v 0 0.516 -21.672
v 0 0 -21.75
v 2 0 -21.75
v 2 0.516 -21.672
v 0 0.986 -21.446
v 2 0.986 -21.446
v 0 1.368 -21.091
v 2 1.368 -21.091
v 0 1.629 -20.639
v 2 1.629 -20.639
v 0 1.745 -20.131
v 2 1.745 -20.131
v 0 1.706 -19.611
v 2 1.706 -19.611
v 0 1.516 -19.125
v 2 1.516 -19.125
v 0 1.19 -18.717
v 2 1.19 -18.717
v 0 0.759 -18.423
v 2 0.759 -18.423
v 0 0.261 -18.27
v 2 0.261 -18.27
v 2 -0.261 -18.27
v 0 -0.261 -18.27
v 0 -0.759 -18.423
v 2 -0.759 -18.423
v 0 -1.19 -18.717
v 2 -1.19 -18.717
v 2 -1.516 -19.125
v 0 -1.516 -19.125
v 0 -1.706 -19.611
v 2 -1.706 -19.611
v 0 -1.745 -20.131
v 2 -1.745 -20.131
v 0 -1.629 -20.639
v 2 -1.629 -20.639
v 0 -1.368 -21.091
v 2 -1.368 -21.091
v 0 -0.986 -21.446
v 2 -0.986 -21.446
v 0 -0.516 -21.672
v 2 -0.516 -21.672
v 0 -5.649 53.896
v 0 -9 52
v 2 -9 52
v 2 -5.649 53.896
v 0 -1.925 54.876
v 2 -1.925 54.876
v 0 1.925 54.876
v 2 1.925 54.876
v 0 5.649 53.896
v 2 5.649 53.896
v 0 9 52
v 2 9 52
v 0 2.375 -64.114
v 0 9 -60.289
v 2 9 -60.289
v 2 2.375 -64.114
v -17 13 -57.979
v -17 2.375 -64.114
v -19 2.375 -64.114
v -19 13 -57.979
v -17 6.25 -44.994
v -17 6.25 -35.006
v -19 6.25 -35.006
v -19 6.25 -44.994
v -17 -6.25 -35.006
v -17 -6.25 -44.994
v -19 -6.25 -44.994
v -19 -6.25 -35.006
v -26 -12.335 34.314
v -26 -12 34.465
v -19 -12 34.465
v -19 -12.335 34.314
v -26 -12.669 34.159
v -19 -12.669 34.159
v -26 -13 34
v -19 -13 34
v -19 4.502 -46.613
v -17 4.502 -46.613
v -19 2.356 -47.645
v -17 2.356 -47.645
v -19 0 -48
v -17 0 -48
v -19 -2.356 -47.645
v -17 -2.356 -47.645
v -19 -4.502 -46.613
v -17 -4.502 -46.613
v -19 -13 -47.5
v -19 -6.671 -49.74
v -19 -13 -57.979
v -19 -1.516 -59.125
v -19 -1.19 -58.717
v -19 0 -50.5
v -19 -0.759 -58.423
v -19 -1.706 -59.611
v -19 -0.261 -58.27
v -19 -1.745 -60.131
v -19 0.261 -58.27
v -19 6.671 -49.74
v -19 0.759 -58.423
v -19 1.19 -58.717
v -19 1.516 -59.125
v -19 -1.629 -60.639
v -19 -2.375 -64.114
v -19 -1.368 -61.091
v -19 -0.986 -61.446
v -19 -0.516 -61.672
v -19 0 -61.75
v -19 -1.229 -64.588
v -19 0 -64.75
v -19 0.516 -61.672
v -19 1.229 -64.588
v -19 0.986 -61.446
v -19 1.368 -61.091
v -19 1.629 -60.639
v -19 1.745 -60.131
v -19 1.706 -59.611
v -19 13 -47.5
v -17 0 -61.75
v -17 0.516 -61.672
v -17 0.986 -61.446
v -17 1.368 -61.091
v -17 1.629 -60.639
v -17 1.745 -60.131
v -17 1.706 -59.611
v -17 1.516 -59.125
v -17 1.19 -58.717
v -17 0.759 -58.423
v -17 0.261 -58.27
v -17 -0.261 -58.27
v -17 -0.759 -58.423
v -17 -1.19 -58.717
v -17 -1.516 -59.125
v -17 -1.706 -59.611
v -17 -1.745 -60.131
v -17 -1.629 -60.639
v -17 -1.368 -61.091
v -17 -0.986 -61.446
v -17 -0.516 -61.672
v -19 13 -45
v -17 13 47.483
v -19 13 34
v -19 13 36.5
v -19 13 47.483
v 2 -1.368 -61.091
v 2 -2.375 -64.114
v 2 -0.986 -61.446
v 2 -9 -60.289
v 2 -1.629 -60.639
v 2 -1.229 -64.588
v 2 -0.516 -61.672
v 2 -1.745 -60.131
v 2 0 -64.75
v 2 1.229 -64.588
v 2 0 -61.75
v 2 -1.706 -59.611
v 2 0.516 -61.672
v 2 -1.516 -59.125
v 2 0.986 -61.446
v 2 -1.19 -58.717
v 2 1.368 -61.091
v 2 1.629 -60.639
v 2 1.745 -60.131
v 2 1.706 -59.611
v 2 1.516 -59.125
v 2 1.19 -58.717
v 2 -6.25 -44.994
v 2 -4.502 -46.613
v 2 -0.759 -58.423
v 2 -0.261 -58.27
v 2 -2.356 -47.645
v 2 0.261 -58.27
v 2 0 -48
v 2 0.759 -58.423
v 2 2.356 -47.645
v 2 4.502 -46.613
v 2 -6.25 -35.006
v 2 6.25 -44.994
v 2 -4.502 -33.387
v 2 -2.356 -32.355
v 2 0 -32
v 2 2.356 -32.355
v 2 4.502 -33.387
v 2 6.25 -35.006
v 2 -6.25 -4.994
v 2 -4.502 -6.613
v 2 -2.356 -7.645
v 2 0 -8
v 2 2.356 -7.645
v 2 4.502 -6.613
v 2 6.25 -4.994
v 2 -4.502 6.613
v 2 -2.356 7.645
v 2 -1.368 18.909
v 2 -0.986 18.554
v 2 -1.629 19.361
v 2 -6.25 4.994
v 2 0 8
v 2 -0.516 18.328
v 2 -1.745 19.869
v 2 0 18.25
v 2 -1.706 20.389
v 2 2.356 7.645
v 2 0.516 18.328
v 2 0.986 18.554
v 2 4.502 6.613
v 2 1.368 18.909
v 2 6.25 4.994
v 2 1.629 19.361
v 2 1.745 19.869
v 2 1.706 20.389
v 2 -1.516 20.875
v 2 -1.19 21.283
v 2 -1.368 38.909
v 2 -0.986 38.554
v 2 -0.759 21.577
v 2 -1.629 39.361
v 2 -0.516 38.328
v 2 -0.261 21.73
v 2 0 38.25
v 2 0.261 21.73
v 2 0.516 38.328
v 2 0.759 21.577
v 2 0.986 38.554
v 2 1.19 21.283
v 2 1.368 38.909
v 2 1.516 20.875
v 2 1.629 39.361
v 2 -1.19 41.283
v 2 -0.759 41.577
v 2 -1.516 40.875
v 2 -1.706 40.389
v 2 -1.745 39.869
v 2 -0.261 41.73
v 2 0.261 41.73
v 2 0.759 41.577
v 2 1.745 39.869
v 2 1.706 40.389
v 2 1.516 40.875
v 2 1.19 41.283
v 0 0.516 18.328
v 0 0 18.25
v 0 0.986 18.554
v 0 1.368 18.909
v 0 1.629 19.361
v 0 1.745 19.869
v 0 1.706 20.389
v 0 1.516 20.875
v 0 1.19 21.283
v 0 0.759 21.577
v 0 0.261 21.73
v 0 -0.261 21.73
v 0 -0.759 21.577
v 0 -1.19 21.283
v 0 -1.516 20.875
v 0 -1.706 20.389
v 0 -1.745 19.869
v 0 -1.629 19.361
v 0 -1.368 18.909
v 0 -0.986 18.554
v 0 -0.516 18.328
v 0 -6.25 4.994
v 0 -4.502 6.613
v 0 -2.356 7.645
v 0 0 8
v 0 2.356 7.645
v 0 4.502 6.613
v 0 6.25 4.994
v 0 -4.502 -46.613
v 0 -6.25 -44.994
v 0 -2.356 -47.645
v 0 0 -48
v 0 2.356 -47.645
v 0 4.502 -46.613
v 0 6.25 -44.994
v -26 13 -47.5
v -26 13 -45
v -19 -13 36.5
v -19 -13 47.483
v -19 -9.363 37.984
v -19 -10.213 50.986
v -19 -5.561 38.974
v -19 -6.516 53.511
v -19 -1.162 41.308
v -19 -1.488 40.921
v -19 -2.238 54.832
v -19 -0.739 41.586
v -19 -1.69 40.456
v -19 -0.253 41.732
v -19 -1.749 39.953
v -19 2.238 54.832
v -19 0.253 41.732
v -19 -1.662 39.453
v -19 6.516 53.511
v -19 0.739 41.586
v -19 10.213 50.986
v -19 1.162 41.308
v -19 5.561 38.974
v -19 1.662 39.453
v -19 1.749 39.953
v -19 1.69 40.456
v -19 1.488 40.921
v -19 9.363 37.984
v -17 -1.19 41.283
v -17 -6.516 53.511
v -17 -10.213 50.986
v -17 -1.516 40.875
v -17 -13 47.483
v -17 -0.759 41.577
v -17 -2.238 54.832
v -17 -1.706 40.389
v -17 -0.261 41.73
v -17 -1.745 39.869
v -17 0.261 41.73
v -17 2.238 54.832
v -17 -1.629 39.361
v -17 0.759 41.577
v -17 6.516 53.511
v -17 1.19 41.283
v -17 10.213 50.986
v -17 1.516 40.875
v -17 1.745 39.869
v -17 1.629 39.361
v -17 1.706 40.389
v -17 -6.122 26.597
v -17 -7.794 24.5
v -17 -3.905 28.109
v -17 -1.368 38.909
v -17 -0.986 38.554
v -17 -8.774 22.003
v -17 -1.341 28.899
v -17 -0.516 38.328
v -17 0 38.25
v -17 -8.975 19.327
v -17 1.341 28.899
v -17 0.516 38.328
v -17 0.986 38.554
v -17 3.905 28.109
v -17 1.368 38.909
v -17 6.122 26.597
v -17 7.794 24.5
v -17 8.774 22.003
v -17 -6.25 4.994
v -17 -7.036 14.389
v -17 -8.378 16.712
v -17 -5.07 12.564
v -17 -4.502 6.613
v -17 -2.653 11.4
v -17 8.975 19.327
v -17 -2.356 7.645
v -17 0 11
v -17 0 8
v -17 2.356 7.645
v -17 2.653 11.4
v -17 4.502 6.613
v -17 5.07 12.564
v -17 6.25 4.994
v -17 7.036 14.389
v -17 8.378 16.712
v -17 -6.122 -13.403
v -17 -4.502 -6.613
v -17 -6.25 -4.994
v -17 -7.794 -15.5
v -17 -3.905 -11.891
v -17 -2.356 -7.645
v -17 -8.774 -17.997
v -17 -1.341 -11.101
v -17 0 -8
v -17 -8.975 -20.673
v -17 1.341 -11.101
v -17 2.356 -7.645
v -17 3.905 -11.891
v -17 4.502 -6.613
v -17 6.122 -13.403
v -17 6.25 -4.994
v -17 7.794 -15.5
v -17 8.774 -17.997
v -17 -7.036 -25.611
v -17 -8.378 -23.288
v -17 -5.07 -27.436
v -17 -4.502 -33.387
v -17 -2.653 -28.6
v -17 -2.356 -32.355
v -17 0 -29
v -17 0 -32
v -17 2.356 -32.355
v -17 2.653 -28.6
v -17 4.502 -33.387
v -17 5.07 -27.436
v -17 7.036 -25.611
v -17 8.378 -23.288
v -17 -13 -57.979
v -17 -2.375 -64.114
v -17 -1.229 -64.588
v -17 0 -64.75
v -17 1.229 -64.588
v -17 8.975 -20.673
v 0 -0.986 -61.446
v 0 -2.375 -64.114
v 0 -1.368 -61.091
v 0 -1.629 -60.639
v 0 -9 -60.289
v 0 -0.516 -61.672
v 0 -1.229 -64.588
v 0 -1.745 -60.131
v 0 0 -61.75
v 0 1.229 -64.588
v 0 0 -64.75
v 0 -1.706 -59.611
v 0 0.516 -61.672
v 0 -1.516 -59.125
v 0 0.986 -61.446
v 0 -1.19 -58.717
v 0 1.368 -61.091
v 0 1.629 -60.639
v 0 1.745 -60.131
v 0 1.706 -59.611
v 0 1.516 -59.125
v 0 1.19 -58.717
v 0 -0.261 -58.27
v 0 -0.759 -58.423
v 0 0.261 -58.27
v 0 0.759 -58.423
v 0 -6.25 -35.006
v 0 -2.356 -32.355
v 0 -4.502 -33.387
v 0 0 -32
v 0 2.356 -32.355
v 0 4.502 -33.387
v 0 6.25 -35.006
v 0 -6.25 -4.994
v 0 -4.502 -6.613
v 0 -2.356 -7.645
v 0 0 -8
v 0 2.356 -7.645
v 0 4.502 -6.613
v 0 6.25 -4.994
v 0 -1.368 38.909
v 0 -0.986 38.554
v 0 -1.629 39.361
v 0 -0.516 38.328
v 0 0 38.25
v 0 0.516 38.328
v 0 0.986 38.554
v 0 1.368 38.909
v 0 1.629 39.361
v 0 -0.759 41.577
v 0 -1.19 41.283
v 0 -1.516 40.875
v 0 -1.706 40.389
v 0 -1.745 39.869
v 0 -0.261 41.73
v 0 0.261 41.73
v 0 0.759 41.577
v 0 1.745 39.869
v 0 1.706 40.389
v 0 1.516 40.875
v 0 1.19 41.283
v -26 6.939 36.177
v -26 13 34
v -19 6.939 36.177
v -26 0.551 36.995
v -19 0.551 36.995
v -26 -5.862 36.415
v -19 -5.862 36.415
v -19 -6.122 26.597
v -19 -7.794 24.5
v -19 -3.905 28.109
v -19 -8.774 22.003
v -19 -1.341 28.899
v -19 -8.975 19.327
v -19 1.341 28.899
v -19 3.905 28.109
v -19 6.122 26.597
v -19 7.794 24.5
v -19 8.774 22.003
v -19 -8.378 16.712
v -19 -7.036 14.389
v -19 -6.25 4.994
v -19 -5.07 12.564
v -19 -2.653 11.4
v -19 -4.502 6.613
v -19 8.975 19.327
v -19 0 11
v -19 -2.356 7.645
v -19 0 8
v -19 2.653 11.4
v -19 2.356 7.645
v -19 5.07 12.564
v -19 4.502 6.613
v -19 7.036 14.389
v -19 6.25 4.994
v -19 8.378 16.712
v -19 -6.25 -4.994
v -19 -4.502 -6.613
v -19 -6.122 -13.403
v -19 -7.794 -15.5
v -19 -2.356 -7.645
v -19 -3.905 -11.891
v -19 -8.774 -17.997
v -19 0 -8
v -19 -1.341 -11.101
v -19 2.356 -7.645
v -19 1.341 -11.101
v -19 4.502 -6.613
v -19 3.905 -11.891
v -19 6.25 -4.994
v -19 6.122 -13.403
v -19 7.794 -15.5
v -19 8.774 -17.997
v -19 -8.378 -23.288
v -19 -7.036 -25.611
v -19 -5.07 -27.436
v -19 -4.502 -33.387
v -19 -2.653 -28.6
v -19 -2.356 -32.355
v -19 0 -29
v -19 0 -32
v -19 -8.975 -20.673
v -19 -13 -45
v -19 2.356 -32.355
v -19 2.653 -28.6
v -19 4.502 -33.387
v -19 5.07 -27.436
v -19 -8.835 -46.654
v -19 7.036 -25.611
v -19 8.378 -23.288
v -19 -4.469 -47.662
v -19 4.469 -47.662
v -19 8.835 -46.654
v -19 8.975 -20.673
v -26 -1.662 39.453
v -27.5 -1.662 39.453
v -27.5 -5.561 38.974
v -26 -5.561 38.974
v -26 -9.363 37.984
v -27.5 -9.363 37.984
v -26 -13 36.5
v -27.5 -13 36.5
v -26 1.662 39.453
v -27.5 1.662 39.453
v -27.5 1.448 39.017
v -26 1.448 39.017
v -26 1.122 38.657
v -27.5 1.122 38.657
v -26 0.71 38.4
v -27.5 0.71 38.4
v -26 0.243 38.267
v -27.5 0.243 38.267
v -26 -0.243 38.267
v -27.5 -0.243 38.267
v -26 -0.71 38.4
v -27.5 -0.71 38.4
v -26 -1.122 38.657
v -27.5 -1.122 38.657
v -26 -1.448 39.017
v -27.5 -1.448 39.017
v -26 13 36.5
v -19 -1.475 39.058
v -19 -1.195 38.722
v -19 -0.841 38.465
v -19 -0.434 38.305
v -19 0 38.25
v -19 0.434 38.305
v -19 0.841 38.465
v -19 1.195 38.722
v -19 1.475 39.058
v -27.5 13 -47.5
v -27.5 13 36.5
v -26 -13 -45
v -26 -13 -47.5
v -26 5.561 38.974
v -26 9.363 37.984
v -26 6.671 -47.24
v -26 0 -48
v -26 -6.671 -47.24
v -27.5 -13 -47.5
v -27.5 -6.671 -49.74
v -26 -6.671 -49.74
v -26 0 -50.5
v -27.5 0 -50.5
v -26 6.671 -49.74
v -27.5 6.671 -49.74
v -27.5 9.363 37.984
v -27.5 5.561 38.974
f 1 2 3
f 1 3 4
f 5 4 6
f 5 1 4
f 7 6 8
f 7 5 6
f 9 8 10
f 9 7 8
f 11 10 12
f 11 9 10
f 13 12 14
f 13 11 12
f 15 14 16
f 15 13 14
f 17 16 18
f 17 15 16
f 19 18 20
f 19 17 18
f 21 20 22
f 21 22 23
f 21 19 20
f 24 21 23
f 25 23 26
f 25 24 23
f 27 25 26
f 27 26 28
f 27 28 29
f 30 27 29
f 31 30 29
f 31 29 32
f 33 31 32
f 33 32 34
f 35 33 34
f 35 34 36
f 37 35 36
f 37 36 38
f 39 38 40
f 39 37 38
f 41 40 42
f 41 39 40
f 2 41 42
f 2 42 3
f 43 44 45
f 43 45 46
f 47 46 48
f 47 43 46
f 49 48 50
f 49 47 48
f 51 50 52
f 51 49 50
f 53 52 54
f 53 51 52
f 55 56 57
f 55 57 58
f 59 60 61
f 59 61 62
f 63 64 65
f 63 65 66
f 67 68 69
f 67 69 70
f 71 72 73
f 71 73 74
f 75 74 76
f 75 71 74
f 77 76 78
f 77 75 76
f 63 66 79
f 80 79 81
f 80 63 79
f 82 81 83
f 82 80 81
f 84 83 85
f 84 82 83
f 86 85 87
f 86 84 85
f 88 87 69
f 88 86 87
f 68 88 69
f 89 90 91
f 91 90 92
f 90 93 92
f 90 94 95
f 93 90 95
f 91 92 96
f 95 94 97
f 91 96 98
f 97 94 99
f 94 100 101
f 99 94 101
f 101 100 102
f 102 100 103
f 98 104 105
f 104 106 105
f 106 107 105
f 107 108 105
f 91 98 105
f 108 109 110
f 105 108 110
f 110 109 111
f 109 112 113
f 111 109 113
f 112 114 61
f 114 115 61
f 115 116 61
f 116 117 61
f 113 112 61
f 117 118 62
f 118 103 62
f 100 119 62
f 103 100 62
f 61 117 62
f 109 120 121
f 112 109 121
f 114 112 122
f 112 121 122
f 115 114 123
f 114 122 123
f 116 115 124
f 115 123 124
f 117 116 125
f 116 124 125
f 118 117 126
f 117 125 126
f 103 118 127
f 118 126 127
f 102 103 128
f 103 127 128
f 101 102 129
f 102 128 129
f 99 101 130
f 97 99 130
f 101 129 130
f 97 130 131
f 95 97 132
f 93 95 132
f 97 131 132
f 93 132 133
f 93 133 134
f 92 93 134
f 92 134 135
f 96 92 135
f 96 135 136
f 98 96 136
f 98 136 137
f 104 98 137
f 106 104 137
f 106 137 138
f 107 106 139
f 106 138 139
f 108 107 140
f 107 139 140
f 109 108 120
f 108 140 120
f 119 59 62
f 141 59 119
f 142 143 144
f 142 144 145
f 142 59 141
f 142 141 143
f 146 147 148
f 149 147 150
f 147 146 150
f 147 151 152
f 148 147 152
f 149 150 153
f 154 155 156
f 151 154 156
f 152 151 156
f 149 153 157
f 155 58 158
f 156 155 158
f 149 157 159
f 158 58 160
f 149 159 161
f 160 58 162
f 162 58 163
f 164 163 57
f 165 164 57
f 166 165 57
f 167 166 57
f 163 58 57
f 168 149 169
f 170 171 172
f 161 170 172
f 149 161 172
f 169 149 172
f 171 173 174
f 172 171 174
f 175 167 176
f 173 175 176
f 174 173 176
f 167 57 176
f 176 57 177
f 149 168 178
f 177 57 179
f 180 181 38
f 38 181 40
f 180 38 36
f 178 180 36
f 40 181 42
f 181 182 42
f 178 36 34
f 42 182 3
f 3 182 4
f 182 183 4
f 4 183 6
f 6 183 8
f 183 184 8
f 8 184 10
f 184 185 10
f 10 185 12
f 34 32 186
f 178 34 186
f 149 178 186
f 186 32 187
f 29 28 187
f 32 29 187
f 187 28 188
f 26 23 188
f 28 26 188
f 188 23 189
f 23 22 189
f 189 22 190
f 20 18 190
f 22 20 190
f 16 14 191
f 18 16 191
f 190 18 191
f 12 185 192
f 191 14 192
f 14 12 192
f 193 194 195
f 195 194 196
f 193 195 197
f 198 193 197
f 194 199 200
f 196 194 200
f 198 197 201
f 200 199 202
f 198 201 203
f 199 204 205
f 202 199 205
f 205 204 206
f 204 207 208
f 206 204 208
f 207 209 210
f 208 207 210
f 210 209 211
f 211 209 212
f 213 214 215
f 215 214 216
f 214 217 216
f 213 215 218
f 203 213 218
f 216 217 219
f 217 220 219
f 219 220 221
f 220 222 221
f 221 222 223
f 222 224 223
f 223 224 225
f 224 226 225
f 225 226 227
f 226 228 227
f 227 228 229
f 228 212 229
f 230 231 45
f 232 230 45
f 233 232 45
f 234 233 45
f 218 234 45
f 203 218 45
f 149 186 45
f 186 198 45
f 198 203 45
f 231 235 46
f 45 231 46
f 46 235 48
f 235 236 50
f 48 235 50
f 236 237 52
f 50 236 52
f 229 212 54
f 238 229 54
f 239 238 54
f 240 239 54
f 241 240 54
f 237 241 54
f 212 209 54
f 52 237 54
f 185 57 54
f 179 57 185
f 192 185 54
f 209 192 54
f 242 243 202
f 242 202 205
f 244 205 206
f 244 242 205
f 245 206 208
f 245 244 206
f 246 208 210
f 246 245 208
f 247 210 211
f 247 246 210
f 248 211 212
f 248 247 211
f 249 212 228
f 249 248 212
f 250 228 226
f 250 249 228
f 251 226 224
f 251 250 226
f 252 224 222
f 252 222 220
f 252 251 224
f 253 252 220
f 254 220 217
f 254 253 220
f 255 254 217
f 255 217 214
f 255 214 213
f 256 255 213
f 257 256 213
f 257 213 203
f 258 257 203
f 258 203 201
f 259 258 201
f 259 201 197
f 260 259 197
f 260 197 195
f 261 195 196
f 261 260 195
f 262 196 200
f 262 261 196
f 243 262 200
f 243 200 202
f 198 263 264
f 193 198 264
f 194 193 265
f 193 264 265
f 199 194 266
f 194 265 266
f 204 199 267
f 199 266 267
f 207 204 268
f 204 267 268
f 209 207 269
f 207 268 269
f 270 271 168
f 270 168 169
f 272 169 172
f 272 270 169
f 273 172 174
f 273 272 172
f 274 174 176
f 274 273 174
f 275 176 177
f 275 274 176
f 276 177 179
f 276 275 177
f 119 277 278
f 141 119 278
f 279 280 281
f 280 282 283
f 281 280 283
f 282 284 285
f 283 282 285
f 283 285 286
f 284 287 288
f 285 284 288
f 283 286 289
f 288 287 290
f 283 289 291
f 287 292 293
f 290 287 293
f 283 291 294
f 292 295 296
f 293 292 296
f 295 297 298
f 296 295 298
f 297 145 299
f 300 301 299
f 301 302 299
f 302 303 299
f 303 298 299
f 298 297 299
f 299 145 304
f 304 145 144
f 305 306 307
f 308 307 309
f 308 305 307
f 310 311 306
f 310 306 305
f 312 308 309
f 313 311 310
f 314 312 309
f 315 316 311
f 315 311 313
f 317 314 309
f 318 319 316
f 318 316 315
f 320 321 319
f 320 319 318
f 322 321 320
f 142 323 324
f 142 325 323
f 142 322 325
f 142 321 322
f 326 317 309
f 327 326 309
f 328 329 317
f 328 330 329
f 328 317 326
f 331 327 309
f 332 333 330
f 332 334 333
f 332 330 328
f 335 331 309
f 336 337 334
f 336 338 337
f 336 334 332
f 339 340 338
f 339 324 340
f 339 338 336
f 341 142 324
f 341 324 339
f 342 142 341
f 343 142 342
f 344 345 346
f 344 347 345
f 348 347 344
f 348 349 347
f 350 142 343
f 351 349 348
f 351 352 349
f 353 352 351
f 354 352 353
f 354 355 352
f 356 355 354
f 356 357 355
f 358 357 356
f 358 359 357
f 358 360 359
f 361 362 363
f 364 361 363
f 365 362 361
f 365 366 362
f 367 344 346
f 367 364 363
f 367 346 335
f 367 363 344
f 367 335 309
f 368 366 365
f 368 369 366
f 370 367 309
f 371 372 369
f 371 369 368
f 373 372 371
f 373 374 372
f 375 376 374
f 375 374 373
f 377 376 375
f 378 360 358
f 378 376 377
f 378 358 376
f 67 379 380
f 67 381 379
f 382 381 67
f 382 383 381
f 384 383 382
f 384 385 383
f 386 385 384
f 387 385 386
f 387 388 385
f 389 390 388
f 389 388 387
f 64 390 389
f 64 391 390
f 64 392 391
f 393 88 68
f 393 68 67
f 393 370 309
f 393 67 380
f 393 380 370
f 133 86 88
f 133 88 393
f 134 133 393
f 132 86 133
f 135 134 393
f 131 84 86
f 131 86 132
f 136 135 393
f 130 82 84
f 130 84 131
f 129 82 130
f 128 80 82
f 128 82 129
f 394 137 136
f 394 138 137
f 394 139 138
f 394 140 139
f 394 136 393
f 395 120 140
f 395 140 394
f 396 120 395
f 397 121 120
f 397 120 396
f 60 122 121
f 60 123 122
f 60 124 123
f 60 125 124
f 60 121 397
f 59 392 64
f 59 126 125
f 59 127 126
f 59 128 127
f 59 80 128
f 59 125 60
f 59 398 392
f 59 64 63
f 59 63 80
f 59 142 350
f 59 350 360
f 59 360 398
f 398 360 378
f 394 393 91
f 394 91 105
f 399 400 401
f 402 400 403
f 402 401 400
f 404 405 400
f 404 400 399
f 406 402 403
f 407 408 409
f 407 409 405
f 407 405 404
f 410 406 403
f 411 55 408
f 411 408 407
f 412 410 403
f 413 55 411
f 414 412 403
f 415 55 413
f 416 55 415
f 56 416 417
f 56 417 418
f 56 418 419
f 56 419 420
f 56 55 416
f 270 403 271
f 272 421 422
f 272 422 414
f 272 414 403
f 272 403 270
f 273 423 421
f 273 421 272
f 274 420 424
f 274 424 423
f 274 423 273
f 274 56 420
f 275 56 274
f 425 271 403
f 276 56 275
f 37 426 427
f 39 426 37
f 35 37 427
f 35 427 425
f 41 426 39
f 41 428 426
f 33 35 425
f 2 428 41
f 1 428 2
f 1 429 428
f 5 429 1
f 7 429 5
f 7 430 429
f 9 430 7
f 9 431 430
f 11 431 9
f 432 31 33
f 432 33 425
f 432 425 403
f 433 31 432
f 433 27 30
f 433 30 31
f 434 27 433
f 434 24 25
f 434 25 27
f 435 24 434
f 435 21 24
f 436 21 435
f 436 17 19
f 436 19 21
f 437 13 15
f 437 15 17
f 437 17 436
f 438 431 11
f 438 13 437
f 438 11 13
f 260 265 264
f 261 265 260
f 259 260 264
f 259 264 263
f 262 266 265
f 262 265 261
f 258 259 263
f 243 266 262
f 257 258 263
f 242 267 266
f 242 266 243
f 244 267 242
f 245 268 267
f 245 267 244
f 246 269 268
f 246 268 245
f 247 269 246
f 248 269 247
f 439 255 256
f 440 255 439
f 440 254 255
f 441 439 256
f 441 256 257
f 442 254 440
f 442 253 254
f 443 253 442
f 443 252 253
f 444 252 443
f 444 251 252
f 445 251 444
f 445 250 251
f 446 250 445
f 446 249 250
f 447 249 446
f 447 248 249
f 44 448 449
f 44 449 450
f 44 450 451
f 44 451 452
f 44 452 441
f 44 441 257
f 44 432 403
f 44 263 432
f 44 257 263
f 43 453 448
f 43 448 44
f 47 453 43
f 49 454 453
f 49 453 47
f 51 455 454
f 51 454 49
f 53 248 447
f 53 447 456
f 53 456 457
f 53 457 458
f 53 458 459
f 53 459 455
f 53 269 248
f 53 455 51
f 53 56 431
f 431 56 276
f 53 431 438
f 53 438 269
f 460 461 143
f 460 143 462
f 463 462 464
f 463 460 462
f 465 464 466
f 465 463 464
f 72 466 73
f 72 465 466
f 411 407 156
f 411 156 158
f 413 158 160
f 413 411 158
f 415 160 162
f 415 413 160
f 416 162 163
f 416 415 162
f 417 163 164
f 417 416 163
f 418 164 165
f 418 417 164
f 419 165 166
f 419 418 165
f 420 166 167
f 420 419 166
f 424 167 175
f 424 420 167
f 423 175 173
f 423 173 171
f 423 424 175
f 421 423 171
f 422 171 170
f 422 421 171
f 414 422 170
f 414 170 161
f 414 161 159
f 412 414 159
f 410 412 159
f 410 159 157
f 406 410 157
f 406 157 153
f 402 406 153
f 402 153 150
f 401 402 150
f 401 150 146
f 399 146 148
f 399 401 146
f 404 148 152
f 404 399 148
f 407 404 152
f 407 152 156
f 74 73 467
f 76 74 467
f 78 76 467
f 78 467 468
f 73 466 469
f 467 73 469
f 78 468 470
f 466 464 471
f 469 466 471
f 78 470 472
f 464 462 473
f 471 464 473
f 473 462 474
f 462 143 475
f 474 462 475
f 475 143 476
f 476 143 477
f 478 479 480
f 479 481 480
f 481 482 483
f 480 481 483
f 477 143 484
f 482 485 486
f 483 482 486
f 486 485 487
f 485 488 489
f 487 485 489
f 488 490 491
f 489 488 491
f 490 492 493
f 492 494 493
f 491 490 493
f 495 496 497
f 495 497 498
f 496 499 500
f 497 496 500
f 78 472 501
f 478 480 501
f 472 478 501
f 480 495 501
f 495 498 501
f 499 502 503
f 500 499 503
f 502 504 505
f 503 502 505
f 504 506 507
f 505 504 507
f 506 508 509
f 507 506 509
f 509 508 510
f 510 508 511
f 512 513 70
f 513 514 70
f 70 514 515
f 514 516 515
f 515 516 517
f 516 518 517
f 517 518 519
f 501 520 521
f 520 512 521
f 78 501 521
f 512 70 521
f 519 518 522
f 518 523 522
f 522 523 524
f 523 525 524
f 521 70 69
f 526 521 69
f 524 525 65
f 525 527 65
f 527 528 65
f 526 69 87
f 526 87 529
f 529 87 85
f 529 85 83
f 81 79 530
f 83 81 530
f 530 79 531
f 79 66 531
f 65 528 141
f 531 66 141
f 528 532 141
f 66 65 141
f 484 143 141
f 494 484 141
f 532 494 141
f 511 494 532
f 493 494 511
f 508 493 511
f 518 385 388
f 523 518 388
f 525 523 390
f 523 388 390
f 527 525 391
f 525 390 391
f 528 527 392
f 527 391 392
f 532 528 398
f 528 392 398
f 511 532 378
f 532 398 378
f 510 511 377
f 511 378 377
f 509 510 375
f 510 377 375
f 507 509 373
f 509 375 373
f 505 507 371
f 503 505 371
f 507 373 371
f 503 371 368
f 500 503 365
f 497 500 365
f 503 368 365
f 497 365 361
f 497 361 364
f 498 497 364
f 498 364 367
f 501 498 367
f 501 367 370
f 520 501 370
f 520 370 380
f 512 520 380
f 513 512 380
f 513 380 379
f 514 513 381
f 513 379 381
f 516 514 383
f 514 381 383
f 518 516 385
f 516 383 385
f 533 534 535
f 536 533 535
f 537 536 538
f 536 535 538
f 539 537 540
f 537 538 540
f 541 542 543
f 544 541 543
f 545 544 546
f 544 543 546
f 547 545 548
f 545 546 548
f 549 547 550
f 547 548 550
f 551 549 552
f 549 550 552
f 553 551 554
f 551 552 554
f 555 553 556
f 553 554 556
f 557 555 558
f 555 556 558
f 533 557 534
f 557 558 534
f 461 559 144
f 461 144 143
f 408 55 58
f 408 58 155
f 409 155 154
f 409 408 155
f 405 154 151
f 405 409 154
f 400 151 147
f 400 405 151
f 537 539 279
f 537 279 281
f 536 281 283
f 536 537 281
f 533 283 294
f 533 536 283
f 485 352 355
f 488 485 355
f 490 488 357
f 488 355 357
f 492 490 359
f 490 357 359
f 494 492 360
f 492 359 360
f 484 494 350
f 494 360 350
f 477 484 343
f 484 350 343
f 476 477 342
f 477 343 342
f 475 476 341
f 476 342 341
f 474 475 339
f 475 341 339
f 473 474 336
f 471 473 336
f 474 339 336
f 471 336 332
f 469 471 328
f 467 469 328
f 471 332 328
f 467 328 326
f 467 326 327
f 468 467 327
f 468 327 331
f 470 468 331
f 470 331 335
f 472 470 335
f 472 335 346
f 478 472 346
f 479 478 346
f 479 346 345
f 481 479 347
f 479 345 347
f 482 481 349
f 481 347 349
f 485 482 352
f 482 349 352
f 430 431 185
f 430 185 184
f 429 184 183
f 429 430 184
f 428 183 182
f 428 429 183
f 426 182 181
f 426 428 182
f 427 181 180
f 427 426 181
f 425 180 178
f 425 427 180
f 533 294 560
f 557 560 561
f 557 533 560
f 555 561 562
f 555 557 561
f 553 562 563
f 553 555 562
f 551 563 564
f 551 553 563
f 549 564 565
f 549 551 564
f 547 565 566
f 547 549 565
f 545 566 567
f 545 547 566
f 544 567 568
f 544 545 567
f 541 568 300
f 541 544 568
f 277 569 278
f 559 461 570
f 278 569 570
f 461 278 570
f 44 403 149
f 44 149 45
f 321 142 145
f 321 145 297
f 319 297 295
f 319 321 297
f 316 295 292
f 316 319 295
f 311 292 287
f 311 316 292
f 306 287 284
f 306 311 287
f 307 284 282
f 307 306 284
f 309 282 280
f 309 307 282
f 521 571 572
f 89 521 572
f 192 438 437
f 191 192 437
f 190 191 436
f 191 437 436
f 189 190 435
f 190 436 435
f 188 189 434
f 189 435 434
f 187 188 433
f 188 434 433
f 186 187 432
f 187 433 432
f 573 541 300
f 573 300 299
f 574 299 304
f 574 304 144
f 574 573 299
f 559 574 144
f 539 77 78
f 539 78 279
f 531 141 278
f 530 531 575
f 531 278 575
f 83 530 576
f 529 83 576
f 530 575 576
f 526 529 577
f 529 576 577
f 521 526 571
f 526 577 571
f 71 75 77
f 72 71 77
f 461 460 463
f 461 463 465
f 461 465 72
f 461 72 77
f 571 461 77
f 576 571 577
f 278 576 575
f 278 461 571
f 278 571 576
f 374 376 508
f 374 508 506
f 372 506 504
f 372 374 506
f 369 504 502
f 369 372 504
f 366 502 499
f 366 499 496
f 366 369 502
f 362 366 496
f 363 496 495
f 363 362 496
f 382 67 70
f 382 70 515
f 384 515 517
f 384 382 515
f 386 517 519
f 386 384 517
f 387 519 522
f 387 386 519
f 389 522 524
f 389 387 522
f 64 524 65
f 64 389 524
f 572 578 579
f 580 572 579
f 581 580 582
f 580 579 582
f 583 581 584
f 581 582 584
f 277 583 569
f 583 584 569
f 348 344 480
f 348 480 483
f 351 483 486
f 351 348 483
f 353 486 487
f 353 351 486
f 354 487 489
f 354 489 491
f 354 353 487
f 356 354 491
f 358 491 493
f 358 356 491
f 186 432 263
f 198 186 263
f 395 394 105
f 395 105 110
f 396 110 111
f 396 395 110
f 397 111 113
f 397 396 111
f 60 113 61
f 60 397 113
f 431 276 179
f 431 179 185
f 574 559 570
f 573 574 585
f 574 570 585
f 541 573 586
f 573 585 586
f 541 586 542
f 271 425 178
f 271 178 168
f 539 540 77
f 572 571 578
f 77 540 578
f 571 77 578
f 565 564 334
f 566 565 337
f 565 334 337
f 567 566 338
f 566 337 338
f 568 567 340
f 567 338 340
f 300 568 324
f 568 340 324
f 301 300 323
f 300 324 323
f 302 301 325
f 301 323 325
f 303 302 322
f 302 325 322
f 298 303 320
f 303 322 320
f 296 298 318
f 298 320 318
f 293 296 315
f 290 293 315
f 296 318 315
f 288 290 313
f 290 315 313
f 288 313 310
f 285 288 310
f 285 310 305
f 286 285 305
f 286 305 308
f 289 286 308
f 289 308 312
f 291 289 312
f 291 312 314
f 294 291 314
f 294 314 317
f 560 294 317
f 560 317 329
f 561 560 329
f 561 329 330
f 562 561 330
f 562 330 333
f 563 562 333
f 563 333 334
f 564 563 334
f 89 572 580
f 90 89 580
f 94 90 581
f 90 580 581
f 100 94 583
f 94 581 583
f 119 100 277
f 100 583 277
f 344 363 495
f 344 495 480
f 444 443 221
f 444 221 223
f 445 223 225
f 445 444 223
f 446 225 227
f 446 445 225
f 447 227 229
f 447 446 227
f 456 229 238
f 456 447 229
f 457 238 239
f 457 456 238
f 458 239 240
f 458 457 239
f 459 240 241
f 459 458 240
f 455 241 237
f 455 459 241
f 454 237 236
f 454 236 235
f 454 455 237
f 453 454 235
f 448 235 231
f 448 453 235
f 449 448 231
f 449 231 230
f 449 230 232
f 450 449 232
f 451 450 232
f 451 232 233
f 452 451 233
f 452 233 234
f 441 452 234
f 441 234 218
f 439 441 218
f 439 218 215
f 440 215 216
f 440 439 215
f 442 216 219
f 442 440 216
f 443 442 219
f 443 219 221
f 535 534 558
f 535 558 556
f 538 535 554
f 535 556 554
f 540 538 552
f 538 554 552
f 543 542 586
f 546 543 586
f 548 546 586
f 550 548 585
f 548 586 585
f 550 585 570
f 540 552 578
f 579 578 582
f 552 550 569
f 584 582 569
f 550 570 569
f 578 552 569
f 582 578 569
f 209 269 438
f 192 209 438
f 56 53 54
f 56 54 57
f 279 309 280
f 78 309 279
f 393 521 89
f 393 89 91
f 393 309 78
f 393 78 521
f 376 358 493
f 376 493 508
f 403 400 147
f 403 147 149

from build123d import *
from build123d.topology import SkipClean

# Parameters (mm, degrees)
SKETCH1_R           = 1.75
BOSS_EXTRUDE1_DEPTH = 2
BOSS_EXTRUDE4_START = -17
SKETCH1_10_R        = 1.75
SKETCH1_10_R_2      = 9
BOSS_EXTRUDE4_DEPTH = 2
BOSS_EXTRUDE5_START = 7
BOSS_EXTRUDE5_DEPTH = 7
BOSS_EXTRUDE6_START = 1.5
BOSS_EXTRUDE6_DEPTH = 1.5


with BuildPart() as part:
    # Sketch1 → Boss-Extrude1 (new body)
    with BuildSketch(Plane(origin=(0, 0, 0), x_dir=(0, 0, -1), z_dir=(1, 0, 0))):
        with BuildLine():
            Line((-52, 9), (60.288675135, 9))
            Line((60.288675135, 9), (64.113620668, 2.375))
            ThreePointArc((64.113620668, 2.375), (64.75, 0), (64.113620668, -2.375))
            Line((64.113620668, -2.375), (60.288675135, -9))
            Line((60.288675135, -9), (-52, -9))
            ThreePointArc((-52, -9), (-55, 0), (-52, 9))
        make_face()
        with Locations((20, 0)):
            Circle(SKETCH1_R, mode=Mode.SUBTRACT)
        with Locations((-20, 0)):
            Circle(SKETCH1_R, mode=Mode.SUBTRACT)
        with Locations((-40, 0)):
            Circle(SKETCH1_R, mode=Mode.SUBTRACT)
        with Locations((60, 0)):
            Circle(SKETCH1_R, mode=Mode.SUBTRACT)
        with BuildLine():
            Line((44.993746089, 6.25), (35.006253911, 6.25))
            ThreePointArc((35.006253911, 6.25), (32, 0), (35.006253911, -6.25))
            Line((35.006253911, -6.25), (44.993746089, -6.25))
            ThreePointArc((44.993746089, -6.25), (48, 0), (44.993746089, 6.25))
        make_face(mode=Mode.SUBTRACT)
        with BuildLine():
            Line((4.993746089, -6.25), (-4.993746089, -6.25))
            ThreePointArc((-4.993746089, -6.25), (-8, 0), (-4.993746089, 6.25))
            Line((-4.993746089, 6.25), (4.993746089, 6.25))
            ThreePointArc((4.993746089, 6.25), (8, 0), (4.993746089, -6.25))
        make_face(mode=Mode.SUBTRACT)
    extrude(amount=BOSS_EXTRUDE1_DEPTH)


with BuildPart() as body_2:
    # Sketch1<10> → Boss-Extrude4 (new body)
    with BuildSketch(Plane(origin=(0, 0, 0), x_dir=(0, 0, -1), z_dir=(1, 0, 0)).offset(BOSS_EXTRUDE4_START)):
        with BuildLine():
            ThreePointArc((-47.483314774, 13), (-55, 0), (-47.483314774, -13))
            Line((-47.483314774, -13), (57.979274058, -13))
            Line((57.979274058, -13), (64.113620668, -2.375))
            ThreePointArc((64.113620668, -2.375), (64.75, 0), (64.113620668, 2.375))
            Line((64.113620668, 2.375), (57.979274058, 13))
            Line((57.979274058, 13), (-47.483314774, 13))
        make_face()
        with Locations((-40, 0)):
            Circle(SKETCH1_10_R, mode=Mode.SUBTRACT)
        with Locations((-20, 0)):
            Circle(SKETCH1_10_R_2, mode=Mode.SUBTRACT)
        with BuildLine():
            Line((4.993746089, -6.25), (-4.993746089, -6.25))
            ThreePointArc((-4.993746089, -6.25), (-8, 0), (-4.993746089, 6.25))
            Line((-4.993746089, 6.25), (4.993746089, 6.25))
            ThreePointArc((4.993746089, 6.25), (8, 0), (4.993746089, -6.25))
        make_face(mode=Mode.SUBTRACT)
        with Locations((20, 0)):
            Circle(SKETCH1_10_R_2, mode=Mode.SUBTRACT)
        with BuildLine():
            Line((35.006253911, 6.25), (44.993746089, 6.25))
            ThreePointArc((44.993746089, 6.25), (48, 0), (44.993746089, -6.25))
            Line((44.993746089, -6.25), (35.006253911, -6.25))
            ThreePointArc((35.006253911, -6.25), (32, 0), (35.006253911, 6.25))
        make_face(mode=Mode.SUBTRACT)
        with Locations((60, 0)):
            Circle(SKETCH1_10_R, mode=Mode.SUBTRACT)
    extrude(amount=-BOSS_EXTRUDE4_DEPTH)

    # Sketch5 → Boss-Extrude5 (add)
    with SkipClean():  # the faces are left unmerged after this step: merging them gives an invalid solid
        with BuildSketch(Plane.ZY.offset(19).offset(BOSS_EXTRUDE5_START)):
            with BuildLine():
                Line((36.5, 13), (34, 13))
                ThreePointArc((34, 13), (36.994876185, 0.551349937), (34.464700993, -12))
                ThreePointArc((34.464700993, -12), (34.236997105, -12.502159284), (34, -13))
                Line((34, -13), (36.5, -13))
                ThreePointArc((36.5, -13), (38.54193302, -7.478463419), (39.453383978, -1.662441254))
                ThreePointArc((39.453383978, -1.662441254), (38.25, 0), (39.453383978, 1.662441254))
                ThreePointArc((39.453383978, 1.662441254), (38.54193302, 7.478463419), (36.5, 13))
            make_face()
            with BuildLine():
                ThreePointArc((-45, 13), (-48, 0), (-45, -13))
                Line((-45, -13), (-47.5, -13))
                ThreePointArc((-47.5, -13), (-50.5, 0), (-47.5, 13))
                Line((-47.5, 13), (-45, 13))
            make_face()
        extrude(amount=-BOSS_EXTRUDE5_DEPTH)

    # Sketch6 → Boss-Extrude6 (add)
    with SkipClean():  # the faces are left unmerged after this step: merging them gives an invalid solid
        with BuildSketch(Plane.ZY.offset(26).offset(BOSS_EXTRUDE6_START)):
            with BuildLine():
                Line((-47.5, 13), (36.5, 13))
                ThreePointArc((36.5, 13), (38.54193302, 7.478463419), (39.453383978, 1.662441254))
                ThreePointArc((39.453383978, 1.662441254), (38.25, 0), (39.453383978, -1.662441254))
                ThreePointArc((39.453383978, -1.662441254), (38.54193302, -7.478463419), (36.5, -13))
                Line((36.5, -13), (-47.5, -13))
                ThreePointArc((-47.5, -13), (-50.5, 0), (-47.5, 13))
            make_face()
        extrude(amount=-BOSS_EXTRUDE6_DEPTH)


solid = Compound([part.part, body_2.part])
